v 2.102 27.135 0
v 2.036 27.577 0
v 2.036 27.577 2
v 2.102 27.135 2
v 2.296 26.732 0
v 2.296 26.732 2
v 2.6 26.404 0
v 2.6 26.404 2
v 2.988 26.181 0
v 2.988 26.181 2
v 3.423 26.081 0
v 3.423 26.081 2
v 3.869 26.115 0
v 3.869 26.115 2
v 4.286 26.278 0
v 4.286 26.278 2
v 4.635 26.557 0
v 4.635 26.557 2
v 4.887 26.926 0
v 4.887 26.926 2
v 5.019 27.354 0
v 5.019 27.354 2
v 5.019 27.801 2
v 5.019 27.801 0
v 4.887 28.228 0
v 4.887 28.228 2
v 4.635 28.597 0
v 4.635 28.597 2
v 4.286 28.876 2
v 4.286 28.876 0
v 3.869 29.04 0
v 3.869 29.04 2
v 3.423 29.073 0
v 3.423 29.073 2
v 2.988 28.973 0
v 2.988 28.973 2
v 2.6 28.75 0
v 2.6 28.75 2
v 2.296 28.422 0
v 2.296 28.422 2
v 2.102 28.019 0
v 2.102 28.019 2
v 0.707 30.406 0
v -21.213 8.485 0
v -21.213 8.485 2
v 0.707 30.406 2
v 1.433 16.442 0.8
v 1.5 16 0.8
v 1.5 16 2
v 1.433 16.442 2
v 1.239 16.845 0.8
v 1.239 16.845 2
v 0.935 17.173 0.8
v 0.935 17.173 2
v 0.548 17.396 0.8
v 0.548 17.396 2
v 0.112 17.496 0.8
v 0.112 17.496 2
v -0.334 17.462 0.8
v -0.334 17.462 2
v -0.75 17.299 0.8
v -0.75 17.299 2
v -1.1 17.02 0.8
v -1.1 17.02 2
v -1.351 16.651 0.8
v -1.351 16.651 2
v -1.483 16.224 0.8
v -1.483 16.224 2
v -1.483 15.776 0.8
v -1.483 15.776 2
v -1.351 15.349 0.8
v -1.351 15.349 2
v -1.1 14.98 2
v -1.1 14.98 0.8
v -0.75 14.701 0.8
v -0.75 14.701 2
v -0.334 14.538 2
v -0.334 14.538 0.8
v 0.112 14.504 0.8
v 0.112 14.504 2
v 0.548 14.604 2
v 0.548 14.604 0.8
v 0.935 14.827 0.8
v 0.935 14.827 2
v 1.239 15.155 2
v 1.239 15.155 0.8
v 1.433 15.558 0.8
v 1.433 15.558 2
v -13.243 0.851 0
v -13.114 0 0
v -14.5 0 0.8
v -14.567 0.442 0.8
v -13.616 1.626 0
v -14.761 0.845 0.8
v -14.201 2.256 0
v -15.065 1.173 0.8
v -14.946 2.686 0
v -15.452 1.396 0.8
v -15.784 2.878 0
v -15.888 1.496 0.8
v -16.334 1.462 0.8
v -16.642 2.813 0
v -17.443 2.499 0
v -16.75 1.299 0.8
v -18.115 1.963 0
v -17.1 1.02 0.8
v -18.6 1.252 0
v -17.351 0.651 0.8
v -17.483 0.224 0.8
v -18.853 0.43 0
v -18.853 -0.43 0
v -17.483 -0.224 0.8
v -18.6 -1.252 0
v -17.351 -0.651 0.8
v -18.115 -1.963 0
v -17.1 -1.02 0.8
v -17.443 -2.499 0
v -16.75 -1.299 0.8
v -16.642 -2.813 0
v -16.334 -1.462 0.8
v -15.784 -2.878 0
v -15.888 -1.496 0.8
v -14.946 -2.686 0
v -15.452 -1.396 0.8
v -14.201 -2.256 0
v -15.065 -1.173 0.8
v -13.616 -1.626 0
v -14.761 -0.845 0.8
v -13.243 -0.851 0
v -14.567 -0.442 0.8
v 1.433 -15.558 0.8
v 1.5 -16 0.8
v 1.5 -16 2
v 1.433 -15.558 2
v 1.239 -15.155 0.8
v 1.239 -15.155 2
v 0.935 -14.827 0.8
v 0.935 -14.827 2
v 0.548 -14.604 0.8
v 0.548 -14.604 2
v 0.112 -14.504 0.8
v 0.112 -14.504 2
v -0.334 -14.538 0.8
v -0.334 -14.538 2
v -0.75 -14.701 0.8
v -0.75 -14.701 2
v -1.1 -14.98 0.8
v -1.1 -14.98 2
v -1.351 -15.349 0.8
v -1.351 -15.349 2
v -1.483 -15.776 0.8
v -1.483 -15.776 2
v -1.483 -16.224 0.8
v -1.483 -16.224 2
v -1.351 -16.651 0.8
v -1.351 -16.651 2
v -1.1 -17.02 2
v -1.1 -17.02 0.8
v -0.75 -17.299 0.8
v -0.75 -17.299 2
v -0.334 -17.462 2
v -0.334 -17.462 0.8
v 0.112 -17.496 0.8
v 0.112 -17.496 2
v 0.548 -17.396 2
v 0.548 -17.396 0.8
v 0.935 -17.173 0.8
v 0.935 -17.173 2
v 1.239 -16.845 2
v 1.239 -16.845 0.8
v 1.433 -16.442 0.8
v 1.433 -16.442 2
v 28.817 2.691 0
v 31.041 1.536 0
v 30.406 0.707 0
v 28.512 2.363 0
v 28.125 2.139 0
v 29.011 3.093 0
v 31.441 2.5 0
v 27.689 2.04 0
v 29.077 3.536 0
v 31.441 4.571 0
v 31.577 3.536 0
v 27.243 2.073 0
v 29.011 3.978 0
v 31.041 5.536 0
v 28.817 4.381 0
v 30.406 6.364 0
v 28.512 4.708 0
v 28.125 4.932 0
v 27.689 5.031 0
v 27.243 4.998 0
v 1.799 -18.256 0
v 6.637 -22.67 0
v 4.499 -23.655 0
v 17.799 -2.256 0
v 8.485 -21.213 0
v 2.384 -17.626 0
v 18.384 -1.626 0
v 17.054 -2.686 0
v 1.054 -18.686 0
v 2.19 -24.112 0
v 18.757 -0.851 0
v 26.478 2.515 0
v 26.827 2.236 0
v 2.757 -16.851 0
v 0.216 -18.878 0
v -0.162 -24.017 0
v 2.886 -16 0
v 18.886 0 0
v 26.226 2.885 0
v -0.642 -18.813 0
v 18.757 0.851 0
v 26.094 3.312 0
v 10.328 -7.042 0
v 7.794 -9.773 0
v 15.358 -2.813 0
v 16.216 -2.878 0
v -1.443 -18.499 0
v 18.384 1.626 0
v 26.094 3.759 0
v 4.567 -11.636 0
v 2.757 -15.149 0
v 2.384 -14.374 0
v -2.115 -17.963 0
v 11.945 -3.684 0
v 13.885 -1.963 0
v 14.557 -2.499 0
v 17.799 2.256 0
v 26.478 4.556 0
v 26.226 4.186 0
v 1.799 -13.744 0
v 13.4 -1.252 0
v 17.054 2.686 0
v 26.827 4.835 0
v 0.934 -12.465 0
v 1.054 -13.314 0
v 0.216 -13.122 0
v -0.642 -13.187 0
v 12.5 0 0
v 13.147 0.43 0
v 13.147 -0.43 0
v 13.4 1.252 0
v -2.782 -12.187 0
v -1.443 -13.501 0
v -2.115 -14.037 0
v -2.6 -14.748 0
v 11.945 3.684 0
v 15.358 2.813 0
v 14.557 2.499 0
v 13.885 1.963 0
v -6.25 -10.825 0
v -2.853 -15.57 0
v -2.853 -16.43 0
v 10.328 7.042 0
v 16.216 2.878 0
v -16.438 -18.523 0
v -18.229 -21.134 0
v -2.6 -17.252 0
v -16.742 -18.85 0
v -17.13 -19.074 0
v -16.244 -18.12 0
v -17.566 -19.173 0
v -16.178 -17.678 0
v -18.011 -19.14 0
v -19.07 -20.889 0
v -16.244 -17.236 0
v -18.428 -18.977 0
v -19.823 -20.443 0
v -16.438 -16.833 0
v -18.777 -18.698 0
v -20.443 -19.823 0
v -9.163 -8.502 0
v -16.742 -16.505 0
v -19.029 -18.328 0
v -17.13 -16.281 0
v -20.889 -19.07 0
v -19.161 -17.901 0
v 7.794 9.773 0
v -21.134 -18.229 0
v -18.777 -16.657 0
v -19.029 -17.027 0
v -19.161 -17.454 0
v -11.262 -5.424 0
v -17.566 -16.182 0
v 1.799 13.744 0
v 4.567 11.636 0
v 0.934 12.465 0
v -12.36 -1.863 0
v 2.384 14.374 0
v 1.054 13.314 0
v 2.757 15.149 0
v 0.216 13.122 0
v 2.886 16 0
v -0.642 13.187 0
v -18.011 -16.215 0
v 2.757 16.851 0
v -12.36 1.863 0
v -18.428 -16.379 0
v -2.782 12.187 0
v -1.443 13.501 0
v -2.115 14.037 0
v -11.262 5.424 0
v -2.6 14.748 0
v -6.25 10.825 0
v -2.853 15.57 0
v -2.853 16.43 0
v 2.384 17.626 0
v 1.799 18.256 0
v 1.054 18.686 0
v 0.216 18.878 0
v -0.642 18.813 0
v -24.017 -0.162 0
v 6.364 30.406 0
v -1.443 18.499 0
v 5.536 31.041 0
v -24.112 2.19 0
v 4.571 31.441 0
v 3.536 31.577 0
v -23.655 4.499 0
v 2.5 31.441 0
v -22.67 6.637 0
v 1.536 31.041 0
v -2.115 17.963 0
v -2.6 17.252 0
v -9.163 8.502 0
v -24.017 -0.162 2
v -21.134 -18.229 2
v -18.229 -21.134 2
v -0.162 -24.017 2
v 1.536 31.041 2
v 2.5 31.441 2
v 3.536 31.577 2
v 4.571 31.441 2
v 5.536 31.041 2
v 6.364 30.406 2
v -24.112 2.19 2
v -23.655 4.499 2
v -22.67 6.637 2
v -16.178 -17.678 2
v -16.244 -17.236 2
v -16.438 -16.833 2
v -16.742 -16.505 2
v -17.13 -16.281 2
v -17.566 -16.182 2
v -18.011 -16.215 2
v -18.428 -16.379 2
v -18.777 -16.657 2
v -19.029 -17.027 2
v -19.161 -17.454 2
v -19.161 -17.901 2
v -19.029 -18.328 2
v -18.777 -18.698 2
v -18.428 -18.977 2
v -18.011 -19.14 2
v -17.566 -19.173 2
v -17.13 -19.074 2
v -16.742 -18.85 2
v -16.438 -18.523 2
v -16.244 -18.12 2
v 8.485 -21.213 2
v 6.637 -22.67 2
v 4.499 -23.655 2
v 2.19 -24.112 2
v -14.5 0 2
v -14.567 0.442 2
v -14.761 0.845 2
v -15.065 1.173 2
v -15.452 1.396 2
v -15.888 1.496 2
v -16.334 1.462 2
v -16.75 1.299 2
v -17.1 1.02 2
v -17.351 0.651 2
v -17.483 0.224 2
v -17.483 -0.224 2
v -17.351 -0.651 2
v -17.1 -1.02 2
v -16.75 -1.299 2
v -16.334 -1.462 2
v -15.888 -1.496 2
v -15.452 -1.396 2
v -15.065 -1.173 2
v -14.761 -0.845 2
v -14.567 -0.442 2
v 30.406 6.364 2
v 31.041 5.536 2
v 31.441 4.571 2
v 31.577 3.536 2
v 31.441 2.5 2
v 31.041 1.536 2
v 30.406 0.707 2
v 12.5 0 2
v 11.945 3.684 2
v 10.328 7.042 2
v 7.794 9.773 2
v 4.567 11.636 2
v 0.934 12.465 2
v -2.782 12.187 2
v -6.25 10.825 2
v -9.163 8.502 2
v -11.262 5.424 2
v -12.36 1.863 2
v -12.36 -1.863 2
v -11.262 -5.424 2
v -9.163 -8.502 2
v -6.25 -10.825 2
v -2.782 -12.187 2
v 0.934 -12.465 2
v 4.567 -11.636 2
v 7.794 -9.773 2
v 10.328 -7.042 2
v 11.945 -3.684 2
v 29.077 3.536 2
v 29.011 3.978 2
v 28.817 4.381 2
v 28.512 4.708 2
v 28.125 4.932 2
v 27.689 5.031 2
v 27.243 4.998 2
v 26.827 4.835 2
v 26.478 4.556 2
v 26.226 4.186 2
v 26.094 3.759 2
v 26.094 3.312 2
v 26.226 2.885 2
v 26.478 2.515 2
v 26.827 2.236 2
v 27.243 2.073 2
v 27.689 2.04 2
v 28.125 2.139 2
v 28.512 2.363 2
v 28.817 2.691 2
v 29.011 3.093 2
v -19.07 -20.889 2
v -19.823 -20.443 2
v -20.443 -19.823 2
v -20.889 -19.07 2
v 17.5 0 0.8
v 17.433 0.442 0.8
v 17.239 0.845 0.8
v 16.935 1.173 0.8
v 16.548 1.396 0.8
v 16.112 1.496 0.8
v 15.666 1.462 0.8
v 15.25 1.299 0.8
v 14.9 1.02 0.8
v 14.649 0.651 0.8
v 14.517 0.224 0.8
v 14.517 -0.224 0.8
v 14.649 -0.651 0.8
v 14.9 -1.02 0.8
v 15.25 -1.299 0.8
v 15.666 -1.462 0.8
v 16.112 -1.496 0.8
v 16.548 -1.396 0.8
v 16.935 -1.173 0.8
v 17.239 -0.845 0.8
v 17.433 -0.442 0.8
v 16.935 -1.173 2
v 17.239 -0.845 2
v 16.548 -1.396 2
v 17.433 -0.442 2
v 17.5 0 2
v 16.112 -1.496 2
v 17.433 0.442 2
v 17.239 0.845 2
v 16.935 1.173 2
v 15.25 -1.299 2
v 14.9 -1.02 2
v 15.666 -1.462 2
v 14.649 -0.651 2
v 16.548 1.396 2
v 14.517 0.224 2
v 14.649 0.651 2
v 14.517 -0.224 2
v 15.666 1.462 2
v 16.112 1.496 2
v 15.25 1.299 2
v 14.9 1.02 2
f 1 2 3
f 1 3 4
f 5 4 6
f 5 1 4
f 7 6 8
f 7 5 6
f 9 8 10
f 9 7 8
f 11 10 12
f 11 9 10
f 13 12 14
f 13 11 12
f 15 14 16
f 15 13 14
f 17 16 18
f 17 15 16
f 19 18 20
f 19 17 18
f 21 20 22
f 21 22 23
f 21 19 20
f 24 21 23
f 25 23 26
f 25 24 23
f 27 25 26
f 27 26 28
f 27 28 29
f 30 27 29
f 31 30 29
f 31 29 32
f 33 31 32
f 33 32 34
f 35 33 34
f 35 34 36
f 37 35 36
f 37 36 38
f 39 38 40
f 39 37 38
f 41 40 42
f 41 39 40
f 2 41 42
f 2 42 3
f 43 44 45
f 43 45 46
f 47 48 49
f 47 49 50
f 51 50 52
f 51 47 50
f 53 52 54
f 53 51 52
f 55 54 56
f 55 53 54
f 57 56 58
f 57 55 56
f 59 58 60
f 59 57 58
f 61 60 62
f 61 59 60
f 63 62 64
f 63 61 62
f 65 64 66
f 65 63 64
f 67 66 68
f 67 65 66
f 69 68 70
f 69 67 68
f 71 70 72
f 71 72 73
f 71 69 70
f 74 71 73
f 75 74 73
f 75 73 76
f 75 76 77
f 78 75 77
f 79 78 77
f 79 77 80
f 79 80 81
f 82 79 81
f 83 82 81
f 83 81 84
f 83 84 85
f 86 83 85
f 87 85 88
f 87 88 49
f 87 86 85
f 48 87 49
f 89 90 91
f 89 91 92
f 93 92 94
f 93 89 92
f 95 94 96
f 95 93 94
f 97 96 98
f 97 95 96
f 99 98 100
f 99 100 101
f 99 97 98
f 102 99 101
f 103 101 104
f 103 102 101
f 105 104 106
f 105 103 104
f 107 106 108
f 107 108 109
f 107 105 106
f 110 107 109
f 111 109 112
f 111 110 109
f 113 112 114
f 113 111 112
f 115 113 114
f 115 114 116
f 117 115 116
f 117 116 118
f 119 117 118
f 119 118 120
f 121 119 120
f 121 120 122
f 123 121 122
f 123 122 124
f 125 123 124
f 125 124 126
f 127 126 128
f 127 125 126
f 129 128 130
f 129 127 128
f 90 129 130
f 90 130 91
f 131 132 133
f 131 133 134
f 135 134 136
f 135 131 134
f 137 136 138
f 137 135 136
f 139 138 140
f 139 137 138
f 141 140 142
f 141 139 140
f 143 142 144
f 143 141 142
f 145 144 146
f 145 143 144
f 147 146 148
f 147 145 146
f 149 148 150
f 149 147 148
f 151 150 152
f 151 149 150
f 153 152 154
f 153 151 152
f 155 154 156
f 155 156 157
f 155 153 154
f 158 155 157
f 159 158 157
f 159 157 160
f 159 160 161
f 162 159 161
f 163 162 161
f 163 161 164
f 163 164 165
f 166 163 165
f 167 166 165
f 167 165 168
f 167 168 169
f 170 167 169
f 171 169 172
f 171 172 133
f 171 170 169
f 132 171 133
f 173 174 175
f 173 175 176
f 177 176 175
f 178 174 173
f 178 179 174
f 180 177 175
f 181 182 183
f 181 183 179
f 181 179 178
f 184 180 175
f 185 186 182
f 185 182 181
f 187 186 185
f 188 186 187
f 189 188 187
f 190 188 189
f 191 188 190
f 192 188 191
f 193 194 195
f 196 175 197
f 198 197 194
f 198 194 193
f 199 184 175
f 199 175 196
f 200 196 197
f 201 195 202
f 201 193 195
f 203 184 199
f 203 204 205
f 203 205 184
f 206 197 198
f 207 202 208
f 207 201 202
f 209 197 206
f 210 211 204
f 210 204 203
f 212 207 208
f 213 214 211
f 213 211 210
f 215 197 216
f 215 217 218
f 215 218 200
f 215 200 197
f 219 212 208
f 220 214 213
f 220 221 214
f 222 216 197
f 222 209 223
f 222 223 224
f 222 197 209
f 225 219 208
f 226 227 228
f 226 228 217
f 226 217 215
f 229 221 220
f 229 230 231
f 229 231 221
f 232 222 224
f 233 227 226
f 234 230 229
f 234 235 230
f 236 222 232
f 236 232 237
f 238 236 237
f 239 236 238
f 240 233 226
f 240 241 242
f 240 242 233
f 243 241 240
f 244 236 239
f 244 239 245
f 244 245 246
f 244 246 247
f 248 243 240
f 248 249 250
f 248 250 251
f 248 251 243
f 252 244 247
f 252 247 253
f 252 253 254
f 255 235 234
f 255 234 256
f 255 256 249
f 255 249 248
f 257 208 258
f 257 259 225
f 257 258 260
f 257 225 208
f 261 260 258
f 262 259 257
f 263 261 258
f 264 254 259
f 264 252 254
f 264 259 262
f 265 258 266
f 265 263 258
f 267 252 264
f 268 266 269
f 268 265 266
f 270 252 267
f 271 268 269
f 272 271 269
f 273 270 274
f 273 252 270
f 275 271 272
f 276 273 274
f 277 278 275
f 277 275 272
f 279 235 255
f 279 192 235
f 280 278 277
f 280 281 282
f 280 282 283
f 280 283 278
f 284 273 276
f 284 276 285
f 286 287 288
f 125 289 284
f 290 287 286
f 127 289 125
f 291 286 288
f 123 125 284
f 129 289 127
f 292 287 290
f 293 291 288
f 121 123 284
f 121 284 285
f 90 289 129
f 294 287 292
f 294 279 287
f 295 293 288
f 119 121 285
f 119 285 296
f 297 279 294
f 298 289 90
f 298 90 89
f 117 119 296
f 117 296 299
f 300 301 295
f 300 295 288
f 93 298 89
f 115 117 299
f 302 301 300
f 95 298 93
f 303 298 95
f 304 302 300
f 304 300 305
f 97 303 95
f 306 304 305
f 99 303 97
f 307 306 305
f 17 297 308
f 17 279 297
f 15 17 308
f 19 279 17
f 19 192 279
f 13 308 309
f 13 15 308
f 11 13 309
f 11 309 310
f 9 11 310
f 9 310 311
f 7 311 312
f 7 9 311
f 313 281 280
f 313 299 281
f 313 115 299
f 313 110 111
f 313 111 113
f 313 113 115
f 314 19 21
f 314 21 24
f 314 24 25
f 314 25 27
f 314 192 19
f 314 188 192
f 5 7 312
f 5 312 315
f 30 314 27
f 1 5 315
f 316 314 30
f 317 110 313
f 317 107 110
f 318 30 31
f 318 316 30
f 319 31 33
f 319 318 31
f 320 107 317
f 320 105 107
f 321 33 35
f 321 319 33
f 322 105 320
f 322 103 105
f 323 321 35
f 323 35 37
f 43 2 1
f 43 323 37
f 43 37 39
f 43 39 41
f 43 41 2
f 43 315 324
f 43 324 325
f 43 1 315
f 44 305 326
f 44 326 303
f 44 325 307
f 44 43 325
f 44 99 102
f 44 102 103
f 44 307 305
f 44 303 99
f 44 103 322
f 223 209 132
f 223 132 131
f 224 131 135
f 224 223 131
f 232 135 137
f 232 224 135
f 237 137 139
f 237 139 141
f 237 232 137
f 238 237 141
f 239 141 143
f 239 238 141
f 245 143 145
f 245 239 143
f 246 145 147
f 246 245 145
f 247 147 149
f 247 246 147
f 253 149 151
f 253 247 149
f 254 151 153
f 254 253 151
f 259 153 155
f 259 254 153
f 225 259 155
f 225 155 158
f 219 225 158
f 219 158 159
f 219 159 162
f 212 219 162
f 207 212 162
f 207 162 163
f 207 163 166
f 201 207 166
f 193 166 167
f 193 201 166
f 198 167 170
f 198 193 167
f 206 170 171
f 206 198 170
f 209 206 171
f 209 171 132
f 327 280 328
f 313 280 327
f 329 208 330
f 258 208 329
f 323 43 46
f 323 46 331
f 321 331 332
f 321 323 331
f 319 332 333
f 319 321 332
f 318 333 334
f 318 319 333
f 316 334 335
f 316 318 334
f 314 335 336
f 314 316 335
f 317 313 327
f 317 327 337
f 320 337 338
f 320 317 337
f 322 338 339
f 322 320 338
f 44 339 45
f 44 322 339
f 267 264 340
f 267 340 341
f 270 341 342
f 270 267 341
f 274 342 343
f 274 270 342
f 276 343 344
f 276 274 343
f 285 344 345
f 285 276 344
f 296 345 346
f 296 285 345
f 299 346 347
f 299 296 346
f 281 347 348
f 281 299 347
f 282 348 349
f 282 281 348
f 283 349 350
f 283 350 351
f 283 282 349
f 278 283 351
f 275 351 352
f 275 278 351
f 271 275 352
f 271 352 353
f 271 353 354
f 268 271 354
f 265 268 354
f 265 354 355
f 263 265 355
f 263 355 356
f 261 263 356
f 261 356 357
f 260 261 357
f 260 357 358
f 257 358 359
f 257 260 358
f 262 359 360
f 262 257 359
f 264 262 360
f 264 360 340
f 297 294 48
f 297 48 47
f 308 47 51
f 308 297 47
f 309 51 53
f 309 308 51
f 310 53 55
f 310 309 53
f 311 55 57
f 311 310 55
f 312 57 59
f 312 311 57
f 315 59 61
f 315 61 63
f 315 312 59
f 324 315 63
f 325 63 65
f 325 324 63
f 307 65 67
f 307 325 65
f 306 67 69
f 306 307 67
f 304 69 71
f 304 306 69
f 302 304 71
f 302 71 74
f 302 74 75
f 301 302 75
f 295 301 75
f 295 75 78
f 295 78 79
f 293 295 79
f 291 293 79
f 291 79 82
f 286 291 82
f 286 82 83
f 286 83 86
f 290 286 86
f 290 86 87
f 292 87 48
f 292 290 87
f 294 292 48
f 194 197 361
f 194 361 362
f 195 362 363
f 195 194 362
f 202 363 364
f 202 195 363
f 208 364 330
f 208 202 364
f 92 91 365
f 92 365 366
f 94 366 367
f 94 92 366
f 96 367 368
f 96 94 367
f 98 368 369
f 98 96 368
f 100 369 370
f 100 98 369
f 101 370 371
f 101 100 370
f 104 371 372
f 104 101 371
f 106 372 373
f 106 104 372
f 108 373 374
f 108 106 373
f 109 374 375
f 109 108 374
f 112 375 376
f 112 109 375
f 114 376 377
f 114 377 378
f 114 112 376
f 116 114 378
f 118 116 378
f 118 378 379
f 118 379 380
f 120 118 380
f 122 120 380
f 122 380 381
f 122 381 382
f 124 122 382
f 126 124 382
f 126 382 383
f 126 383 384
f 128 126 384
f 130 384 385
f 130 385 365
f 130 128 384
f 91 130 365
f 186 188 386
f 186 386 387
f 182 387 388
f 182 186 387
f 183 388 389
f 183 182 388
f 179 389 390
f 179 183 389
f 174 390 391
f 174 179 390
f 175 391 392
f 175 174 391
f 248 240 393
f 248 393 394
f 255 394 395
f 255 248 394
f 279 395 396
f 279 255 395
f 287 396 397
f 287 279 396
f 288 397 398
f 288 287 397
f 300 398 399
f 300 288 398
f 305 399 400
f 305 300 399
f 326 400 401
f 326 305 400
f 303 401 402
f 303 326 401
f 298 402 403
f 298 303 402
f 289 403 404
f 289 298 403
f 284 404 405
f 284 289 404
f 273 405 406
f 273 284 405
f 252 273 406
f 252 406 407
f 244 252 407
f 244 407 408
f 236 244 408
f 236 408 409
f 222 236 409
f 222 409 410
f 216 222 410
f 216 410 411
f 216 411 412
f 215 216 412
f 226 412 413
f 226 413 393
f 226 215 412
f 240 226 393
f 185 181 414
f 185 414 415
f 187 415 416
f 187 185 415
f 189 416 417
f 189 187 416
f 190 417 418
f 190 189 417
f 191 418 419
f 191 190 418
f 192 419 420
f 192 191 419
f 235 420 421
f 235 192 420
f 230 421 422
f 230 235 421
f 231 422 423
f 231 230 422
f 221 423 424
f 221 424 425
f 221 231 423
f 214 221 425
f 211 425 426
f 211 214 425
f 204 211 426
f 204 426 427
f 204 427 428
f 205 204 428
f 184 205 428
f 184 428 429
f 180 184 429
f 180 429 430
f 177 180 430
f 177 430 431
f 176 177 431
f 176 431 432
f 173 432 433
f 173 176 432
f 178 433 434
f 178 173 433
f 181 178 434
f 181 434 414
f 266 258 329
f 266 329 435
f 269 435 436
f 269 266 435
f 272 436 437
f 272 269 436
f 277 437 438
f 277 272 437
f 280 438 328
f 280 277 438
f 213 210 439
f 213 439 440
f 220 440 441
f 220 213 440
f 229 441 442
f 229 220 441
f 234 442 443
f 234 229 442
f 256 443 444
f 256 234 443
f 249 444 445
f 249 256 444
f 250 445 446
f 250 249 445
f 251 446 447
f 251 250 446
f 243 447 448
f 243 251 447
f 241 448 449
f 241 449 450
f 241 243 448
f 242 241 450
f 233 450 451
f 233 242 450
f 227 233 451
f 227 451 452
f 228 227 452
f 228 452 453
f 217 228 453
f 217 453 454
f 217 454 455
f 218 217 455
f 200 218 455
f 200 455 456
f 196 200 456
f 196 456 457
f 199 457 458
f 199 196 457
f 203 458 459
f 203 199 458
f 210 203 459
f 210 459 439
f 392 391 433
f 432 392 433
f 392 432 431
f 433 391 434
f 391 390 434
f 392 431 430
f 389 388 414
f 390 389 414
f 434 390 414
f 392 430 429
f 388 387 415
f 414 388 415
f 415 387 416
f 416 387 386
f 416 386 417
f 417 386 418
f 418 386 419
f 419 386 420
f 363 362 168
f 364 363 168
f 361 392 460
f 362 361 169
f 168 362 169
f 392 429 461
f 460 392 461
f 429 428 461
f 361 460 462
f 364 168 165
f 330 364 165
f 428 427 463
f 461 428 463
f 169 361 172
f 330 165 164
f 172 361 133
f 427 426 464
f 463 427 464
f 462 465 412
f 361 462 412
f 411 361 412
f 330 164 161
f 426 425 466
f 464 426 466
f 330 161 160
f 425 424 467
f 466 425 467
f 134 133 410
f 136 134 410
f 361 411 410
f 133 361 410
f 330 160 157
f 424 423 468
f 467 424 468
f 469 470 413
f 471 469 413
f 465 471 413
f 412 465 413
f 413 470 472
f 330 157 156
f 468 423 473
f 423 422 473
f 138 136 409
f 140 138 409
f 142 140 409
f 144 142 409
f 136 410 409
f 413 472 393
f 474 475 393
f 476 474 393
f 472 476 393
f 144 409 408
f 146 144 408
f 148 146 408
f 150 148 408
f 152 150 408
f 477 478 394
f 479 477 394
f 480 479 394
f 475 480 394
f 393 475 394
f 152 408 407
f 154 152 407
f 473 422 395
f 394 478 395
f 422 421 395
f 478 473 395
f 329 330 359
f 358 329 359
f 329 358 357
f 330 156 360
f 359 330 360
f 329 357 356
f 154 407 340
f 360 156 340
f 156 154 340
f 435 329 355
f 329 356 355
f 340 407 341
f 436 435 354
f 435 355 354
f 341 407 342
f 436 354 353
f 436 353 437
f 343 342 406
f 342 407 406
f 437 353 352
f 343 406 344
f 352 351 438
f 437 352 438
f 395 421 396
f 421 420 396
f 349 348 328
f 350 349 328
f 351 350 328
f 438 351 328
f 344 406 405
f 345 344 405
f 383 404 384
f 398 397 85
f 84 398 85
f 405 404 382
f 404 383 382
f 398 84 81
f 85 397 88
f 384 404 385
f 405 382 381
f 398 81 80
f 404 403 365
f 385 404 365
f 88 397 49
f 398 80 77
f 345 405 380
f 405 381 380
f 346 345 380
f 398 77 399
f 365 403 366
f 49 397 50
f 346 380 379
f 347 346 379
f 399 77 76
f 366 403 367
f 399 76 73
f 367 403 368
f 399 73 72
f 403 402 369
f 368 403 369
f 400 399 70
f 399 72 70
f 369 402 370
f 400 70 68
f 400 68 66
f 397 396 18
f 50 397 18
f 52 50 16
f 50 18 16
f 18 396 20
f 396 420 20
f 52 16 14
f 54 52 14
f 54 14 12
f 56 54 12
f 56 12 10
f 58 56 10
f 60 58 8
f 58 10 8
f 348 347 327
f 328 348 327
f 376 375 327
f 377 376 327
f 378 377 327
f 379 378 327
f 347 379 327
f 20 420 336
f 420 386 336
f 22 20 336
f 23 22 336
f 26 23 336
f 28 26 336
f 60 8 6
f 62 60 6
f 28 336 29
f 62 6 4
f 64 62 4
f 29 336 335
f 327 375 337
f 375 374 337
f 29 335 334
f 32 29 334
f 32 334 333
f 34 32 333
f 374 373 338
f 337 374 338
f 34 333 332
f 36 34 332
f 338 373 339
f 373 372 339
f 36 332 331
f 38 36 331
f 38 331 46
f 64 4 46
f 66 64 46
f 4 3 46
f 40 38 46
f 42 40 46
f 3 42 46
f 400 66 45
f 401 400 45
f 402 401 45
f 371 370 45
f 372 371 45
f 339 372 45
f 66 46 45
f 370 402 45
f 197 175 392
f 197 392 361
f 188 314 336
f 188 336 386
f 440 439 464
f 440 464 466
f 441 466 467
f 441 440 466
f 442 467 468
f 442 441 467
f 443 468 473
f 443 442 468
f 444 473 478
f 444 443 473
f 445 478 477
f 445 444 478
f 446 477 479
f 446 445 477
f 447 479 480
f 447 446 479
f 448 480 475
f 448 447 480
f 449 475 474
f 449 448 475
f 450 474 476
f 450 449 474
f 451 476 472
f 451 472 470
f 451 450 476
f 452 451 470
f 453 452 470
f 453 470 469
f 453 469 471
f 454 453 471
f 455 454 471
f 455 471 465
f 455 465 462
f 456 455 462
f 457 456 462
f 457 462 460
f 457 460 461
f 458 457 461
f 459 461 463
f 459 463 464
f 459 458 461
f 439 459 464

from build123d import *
from OCP.BRepFilletAPI import BRepFilletAPI_MakeChamfer

# Parameters (mm, degrees)
SKICA1_R                = 12.5
SKICA1_R_2              = 1.5
P_IDAT_VYSUNUT_M1_DEPTH = 2
ZKOSEN_1_SIZE           = 0.8
ZKOSEN_1_SIZE2          = 1.385640646


with BuildPart() as part:
    # Skica1 → Přidat vysunutím1 (new body)
    with BuildSketch(Plane.XY):
        with BuildLine():
            Line((6.363961031, 30.405591591), (30.405591591, 6.363961031))
            ThreePointArc((30.405591591, 6.363961031), (31.577164466, 3.535533906), (30.405591591, 0.707106781))
            Line((30.405591591, 0.707106781), (8.485281374, -21.213203436))
            ThreePointArc((8.485281374, -21.213203436), (4.498831017, -23.654503108), (-0.161661635, -24.01718587))
            Line((-0.161661635, -24.01718587), (-18.229225849, -21.133937116))
            ThreePointArc((-18.229225849, -21.133937116), (-20.152543264, -20.152543264), (-21.133937116, -18.229225849))
            Line((-21.133937116, -18.229225849), (-24.01718587, -0.161661635))
            ThreePointArc((-24.01718587, -0.161661635), (-23.654503108, 4.498831017), (-21.213203436, 8.485281374))
            Line((-21.213203436, 8.485281374), (0.707106781, 30.405591591))
            ThreePointArc((0.707106781, 30.405591591), (3.535533906, 31.577164466), (6.363961031, 30.405591591))
        make_face()
        Circle(SKICA1_R, mode=Mode.SUBTRACT)
        with Locations((0, 16)):
            Circle(SKICA1_R_2, mode=Mode.SUBTRACT)
        with Locations((16, 0)):
            Circle(SKICA1_R_2, mode=Mode.SUBTRACT)
        with Locations((0, -16)):
            Circle(SKICA1_R_2, mode=Mode.SUBTRACT)
        with Locations((-16, 0)):
            Circle(SKICA1_R_2, mode=Mode.SUBTRACT)
        with Locations((-17.67766953, -17.67766953)):
            Circle(SKICA1_R_2, mode=Mode.SUBTRACT)
        with Locations((27.577164466, 3.535533906)):
            Circle(SKICA1_R_2, mode=Mode.SUBTRACT)
        with Locations(Location((3.535533906, 27.577164466, 0), (0, 0, 180))):
            Circle(SKICA1_R_2, mode=Mode.SUBTRACT)
    extrude(amount=P_IDAT_VYSUNUT_M1_DEPTH)

    # Zkosení1: one chamfer whose edges measure the first distance from different faces: ONE call of the kernel's chamfer builder (chamfer() names one face for all edges)
    zkosen_1_edges_1 = [part.edges().sort_by_distance(p)[0] for p in [
        (-1.5, 16, 0),
    ]]
    zkosen_1_side_1 = [part.faces().sort_by_distance(p)[0] for p in [
        (-1.5, 16, 1),
    ]]
    zkosen_1_edges_2 = [part.edges().sort_by_distance(p)[0] for p in [
        (14.5, 0, 0),
    ]]
    zkosen_1_side_2 = [part.faces().sort_by_distance(p)[0] for p in [
        (14.5, 0, 1),
    ]]
    zkosen_1_edges_3 = [part.edges().sort_by_distance(p)[0] for p in [
        (-1.5, -16, 0),
    ]]
    zkosen_1_side_3 = [part.faces().sort_by_distance(p)[0] for p in [
        (-1.5, -16, 1),
    ]]
    zkosen_1_edges_4 = [part.edges().sort_by_distance(p)[0] for p in [
        (-17.5, 0, 0),
    ]]
    zkosen_1_side_4 = [part.faces().sort_by_distance(p)[0] for p in [
        (-17.5, 0, 1),
    ]]
    zkosen_1 = BRepFilletAPI_MakeChamfer(part.part.solid().wrapped)
    for e in zkosen_1_edges_1:
        zkosen_1.Add(ZKOSEN_1_SIZE, ZKOSEN_1_SIZE2, e.wrapped, zkosen_1_side_1[0].wrapped)  # the first distance lies on this face
    for e in zkosen_1_edges_2:
        zkosen_1.Add(ZKOSEN_1_SIZE, ZKOSEN_1_SIZE2, e.wrapped, zkosen_1_side_2[0].wrapped)  # the first distance lies on this face
    for e in zkosen_1_edges_3:
        zkosen_1.Add(ZKOSEN_1_SIZE, ZKOSEN_1_SIZE2, e.wrapped, zkosen_1_side_3[0].wrapped)  # the first distance lies on this face
    for e in zkosen_1_edges_4:
        zkosen_1.Add(ZKOSEN_1_SIZE, ZKOSEN_1_SIZE2, e.wrapped, zkosen_1_side_4[0].wrapped)  # the first distance lies on this face
    add(Compound.cast(zkosen_1.Shape()), mode=Mode.REPLACE)


solid = part.part
